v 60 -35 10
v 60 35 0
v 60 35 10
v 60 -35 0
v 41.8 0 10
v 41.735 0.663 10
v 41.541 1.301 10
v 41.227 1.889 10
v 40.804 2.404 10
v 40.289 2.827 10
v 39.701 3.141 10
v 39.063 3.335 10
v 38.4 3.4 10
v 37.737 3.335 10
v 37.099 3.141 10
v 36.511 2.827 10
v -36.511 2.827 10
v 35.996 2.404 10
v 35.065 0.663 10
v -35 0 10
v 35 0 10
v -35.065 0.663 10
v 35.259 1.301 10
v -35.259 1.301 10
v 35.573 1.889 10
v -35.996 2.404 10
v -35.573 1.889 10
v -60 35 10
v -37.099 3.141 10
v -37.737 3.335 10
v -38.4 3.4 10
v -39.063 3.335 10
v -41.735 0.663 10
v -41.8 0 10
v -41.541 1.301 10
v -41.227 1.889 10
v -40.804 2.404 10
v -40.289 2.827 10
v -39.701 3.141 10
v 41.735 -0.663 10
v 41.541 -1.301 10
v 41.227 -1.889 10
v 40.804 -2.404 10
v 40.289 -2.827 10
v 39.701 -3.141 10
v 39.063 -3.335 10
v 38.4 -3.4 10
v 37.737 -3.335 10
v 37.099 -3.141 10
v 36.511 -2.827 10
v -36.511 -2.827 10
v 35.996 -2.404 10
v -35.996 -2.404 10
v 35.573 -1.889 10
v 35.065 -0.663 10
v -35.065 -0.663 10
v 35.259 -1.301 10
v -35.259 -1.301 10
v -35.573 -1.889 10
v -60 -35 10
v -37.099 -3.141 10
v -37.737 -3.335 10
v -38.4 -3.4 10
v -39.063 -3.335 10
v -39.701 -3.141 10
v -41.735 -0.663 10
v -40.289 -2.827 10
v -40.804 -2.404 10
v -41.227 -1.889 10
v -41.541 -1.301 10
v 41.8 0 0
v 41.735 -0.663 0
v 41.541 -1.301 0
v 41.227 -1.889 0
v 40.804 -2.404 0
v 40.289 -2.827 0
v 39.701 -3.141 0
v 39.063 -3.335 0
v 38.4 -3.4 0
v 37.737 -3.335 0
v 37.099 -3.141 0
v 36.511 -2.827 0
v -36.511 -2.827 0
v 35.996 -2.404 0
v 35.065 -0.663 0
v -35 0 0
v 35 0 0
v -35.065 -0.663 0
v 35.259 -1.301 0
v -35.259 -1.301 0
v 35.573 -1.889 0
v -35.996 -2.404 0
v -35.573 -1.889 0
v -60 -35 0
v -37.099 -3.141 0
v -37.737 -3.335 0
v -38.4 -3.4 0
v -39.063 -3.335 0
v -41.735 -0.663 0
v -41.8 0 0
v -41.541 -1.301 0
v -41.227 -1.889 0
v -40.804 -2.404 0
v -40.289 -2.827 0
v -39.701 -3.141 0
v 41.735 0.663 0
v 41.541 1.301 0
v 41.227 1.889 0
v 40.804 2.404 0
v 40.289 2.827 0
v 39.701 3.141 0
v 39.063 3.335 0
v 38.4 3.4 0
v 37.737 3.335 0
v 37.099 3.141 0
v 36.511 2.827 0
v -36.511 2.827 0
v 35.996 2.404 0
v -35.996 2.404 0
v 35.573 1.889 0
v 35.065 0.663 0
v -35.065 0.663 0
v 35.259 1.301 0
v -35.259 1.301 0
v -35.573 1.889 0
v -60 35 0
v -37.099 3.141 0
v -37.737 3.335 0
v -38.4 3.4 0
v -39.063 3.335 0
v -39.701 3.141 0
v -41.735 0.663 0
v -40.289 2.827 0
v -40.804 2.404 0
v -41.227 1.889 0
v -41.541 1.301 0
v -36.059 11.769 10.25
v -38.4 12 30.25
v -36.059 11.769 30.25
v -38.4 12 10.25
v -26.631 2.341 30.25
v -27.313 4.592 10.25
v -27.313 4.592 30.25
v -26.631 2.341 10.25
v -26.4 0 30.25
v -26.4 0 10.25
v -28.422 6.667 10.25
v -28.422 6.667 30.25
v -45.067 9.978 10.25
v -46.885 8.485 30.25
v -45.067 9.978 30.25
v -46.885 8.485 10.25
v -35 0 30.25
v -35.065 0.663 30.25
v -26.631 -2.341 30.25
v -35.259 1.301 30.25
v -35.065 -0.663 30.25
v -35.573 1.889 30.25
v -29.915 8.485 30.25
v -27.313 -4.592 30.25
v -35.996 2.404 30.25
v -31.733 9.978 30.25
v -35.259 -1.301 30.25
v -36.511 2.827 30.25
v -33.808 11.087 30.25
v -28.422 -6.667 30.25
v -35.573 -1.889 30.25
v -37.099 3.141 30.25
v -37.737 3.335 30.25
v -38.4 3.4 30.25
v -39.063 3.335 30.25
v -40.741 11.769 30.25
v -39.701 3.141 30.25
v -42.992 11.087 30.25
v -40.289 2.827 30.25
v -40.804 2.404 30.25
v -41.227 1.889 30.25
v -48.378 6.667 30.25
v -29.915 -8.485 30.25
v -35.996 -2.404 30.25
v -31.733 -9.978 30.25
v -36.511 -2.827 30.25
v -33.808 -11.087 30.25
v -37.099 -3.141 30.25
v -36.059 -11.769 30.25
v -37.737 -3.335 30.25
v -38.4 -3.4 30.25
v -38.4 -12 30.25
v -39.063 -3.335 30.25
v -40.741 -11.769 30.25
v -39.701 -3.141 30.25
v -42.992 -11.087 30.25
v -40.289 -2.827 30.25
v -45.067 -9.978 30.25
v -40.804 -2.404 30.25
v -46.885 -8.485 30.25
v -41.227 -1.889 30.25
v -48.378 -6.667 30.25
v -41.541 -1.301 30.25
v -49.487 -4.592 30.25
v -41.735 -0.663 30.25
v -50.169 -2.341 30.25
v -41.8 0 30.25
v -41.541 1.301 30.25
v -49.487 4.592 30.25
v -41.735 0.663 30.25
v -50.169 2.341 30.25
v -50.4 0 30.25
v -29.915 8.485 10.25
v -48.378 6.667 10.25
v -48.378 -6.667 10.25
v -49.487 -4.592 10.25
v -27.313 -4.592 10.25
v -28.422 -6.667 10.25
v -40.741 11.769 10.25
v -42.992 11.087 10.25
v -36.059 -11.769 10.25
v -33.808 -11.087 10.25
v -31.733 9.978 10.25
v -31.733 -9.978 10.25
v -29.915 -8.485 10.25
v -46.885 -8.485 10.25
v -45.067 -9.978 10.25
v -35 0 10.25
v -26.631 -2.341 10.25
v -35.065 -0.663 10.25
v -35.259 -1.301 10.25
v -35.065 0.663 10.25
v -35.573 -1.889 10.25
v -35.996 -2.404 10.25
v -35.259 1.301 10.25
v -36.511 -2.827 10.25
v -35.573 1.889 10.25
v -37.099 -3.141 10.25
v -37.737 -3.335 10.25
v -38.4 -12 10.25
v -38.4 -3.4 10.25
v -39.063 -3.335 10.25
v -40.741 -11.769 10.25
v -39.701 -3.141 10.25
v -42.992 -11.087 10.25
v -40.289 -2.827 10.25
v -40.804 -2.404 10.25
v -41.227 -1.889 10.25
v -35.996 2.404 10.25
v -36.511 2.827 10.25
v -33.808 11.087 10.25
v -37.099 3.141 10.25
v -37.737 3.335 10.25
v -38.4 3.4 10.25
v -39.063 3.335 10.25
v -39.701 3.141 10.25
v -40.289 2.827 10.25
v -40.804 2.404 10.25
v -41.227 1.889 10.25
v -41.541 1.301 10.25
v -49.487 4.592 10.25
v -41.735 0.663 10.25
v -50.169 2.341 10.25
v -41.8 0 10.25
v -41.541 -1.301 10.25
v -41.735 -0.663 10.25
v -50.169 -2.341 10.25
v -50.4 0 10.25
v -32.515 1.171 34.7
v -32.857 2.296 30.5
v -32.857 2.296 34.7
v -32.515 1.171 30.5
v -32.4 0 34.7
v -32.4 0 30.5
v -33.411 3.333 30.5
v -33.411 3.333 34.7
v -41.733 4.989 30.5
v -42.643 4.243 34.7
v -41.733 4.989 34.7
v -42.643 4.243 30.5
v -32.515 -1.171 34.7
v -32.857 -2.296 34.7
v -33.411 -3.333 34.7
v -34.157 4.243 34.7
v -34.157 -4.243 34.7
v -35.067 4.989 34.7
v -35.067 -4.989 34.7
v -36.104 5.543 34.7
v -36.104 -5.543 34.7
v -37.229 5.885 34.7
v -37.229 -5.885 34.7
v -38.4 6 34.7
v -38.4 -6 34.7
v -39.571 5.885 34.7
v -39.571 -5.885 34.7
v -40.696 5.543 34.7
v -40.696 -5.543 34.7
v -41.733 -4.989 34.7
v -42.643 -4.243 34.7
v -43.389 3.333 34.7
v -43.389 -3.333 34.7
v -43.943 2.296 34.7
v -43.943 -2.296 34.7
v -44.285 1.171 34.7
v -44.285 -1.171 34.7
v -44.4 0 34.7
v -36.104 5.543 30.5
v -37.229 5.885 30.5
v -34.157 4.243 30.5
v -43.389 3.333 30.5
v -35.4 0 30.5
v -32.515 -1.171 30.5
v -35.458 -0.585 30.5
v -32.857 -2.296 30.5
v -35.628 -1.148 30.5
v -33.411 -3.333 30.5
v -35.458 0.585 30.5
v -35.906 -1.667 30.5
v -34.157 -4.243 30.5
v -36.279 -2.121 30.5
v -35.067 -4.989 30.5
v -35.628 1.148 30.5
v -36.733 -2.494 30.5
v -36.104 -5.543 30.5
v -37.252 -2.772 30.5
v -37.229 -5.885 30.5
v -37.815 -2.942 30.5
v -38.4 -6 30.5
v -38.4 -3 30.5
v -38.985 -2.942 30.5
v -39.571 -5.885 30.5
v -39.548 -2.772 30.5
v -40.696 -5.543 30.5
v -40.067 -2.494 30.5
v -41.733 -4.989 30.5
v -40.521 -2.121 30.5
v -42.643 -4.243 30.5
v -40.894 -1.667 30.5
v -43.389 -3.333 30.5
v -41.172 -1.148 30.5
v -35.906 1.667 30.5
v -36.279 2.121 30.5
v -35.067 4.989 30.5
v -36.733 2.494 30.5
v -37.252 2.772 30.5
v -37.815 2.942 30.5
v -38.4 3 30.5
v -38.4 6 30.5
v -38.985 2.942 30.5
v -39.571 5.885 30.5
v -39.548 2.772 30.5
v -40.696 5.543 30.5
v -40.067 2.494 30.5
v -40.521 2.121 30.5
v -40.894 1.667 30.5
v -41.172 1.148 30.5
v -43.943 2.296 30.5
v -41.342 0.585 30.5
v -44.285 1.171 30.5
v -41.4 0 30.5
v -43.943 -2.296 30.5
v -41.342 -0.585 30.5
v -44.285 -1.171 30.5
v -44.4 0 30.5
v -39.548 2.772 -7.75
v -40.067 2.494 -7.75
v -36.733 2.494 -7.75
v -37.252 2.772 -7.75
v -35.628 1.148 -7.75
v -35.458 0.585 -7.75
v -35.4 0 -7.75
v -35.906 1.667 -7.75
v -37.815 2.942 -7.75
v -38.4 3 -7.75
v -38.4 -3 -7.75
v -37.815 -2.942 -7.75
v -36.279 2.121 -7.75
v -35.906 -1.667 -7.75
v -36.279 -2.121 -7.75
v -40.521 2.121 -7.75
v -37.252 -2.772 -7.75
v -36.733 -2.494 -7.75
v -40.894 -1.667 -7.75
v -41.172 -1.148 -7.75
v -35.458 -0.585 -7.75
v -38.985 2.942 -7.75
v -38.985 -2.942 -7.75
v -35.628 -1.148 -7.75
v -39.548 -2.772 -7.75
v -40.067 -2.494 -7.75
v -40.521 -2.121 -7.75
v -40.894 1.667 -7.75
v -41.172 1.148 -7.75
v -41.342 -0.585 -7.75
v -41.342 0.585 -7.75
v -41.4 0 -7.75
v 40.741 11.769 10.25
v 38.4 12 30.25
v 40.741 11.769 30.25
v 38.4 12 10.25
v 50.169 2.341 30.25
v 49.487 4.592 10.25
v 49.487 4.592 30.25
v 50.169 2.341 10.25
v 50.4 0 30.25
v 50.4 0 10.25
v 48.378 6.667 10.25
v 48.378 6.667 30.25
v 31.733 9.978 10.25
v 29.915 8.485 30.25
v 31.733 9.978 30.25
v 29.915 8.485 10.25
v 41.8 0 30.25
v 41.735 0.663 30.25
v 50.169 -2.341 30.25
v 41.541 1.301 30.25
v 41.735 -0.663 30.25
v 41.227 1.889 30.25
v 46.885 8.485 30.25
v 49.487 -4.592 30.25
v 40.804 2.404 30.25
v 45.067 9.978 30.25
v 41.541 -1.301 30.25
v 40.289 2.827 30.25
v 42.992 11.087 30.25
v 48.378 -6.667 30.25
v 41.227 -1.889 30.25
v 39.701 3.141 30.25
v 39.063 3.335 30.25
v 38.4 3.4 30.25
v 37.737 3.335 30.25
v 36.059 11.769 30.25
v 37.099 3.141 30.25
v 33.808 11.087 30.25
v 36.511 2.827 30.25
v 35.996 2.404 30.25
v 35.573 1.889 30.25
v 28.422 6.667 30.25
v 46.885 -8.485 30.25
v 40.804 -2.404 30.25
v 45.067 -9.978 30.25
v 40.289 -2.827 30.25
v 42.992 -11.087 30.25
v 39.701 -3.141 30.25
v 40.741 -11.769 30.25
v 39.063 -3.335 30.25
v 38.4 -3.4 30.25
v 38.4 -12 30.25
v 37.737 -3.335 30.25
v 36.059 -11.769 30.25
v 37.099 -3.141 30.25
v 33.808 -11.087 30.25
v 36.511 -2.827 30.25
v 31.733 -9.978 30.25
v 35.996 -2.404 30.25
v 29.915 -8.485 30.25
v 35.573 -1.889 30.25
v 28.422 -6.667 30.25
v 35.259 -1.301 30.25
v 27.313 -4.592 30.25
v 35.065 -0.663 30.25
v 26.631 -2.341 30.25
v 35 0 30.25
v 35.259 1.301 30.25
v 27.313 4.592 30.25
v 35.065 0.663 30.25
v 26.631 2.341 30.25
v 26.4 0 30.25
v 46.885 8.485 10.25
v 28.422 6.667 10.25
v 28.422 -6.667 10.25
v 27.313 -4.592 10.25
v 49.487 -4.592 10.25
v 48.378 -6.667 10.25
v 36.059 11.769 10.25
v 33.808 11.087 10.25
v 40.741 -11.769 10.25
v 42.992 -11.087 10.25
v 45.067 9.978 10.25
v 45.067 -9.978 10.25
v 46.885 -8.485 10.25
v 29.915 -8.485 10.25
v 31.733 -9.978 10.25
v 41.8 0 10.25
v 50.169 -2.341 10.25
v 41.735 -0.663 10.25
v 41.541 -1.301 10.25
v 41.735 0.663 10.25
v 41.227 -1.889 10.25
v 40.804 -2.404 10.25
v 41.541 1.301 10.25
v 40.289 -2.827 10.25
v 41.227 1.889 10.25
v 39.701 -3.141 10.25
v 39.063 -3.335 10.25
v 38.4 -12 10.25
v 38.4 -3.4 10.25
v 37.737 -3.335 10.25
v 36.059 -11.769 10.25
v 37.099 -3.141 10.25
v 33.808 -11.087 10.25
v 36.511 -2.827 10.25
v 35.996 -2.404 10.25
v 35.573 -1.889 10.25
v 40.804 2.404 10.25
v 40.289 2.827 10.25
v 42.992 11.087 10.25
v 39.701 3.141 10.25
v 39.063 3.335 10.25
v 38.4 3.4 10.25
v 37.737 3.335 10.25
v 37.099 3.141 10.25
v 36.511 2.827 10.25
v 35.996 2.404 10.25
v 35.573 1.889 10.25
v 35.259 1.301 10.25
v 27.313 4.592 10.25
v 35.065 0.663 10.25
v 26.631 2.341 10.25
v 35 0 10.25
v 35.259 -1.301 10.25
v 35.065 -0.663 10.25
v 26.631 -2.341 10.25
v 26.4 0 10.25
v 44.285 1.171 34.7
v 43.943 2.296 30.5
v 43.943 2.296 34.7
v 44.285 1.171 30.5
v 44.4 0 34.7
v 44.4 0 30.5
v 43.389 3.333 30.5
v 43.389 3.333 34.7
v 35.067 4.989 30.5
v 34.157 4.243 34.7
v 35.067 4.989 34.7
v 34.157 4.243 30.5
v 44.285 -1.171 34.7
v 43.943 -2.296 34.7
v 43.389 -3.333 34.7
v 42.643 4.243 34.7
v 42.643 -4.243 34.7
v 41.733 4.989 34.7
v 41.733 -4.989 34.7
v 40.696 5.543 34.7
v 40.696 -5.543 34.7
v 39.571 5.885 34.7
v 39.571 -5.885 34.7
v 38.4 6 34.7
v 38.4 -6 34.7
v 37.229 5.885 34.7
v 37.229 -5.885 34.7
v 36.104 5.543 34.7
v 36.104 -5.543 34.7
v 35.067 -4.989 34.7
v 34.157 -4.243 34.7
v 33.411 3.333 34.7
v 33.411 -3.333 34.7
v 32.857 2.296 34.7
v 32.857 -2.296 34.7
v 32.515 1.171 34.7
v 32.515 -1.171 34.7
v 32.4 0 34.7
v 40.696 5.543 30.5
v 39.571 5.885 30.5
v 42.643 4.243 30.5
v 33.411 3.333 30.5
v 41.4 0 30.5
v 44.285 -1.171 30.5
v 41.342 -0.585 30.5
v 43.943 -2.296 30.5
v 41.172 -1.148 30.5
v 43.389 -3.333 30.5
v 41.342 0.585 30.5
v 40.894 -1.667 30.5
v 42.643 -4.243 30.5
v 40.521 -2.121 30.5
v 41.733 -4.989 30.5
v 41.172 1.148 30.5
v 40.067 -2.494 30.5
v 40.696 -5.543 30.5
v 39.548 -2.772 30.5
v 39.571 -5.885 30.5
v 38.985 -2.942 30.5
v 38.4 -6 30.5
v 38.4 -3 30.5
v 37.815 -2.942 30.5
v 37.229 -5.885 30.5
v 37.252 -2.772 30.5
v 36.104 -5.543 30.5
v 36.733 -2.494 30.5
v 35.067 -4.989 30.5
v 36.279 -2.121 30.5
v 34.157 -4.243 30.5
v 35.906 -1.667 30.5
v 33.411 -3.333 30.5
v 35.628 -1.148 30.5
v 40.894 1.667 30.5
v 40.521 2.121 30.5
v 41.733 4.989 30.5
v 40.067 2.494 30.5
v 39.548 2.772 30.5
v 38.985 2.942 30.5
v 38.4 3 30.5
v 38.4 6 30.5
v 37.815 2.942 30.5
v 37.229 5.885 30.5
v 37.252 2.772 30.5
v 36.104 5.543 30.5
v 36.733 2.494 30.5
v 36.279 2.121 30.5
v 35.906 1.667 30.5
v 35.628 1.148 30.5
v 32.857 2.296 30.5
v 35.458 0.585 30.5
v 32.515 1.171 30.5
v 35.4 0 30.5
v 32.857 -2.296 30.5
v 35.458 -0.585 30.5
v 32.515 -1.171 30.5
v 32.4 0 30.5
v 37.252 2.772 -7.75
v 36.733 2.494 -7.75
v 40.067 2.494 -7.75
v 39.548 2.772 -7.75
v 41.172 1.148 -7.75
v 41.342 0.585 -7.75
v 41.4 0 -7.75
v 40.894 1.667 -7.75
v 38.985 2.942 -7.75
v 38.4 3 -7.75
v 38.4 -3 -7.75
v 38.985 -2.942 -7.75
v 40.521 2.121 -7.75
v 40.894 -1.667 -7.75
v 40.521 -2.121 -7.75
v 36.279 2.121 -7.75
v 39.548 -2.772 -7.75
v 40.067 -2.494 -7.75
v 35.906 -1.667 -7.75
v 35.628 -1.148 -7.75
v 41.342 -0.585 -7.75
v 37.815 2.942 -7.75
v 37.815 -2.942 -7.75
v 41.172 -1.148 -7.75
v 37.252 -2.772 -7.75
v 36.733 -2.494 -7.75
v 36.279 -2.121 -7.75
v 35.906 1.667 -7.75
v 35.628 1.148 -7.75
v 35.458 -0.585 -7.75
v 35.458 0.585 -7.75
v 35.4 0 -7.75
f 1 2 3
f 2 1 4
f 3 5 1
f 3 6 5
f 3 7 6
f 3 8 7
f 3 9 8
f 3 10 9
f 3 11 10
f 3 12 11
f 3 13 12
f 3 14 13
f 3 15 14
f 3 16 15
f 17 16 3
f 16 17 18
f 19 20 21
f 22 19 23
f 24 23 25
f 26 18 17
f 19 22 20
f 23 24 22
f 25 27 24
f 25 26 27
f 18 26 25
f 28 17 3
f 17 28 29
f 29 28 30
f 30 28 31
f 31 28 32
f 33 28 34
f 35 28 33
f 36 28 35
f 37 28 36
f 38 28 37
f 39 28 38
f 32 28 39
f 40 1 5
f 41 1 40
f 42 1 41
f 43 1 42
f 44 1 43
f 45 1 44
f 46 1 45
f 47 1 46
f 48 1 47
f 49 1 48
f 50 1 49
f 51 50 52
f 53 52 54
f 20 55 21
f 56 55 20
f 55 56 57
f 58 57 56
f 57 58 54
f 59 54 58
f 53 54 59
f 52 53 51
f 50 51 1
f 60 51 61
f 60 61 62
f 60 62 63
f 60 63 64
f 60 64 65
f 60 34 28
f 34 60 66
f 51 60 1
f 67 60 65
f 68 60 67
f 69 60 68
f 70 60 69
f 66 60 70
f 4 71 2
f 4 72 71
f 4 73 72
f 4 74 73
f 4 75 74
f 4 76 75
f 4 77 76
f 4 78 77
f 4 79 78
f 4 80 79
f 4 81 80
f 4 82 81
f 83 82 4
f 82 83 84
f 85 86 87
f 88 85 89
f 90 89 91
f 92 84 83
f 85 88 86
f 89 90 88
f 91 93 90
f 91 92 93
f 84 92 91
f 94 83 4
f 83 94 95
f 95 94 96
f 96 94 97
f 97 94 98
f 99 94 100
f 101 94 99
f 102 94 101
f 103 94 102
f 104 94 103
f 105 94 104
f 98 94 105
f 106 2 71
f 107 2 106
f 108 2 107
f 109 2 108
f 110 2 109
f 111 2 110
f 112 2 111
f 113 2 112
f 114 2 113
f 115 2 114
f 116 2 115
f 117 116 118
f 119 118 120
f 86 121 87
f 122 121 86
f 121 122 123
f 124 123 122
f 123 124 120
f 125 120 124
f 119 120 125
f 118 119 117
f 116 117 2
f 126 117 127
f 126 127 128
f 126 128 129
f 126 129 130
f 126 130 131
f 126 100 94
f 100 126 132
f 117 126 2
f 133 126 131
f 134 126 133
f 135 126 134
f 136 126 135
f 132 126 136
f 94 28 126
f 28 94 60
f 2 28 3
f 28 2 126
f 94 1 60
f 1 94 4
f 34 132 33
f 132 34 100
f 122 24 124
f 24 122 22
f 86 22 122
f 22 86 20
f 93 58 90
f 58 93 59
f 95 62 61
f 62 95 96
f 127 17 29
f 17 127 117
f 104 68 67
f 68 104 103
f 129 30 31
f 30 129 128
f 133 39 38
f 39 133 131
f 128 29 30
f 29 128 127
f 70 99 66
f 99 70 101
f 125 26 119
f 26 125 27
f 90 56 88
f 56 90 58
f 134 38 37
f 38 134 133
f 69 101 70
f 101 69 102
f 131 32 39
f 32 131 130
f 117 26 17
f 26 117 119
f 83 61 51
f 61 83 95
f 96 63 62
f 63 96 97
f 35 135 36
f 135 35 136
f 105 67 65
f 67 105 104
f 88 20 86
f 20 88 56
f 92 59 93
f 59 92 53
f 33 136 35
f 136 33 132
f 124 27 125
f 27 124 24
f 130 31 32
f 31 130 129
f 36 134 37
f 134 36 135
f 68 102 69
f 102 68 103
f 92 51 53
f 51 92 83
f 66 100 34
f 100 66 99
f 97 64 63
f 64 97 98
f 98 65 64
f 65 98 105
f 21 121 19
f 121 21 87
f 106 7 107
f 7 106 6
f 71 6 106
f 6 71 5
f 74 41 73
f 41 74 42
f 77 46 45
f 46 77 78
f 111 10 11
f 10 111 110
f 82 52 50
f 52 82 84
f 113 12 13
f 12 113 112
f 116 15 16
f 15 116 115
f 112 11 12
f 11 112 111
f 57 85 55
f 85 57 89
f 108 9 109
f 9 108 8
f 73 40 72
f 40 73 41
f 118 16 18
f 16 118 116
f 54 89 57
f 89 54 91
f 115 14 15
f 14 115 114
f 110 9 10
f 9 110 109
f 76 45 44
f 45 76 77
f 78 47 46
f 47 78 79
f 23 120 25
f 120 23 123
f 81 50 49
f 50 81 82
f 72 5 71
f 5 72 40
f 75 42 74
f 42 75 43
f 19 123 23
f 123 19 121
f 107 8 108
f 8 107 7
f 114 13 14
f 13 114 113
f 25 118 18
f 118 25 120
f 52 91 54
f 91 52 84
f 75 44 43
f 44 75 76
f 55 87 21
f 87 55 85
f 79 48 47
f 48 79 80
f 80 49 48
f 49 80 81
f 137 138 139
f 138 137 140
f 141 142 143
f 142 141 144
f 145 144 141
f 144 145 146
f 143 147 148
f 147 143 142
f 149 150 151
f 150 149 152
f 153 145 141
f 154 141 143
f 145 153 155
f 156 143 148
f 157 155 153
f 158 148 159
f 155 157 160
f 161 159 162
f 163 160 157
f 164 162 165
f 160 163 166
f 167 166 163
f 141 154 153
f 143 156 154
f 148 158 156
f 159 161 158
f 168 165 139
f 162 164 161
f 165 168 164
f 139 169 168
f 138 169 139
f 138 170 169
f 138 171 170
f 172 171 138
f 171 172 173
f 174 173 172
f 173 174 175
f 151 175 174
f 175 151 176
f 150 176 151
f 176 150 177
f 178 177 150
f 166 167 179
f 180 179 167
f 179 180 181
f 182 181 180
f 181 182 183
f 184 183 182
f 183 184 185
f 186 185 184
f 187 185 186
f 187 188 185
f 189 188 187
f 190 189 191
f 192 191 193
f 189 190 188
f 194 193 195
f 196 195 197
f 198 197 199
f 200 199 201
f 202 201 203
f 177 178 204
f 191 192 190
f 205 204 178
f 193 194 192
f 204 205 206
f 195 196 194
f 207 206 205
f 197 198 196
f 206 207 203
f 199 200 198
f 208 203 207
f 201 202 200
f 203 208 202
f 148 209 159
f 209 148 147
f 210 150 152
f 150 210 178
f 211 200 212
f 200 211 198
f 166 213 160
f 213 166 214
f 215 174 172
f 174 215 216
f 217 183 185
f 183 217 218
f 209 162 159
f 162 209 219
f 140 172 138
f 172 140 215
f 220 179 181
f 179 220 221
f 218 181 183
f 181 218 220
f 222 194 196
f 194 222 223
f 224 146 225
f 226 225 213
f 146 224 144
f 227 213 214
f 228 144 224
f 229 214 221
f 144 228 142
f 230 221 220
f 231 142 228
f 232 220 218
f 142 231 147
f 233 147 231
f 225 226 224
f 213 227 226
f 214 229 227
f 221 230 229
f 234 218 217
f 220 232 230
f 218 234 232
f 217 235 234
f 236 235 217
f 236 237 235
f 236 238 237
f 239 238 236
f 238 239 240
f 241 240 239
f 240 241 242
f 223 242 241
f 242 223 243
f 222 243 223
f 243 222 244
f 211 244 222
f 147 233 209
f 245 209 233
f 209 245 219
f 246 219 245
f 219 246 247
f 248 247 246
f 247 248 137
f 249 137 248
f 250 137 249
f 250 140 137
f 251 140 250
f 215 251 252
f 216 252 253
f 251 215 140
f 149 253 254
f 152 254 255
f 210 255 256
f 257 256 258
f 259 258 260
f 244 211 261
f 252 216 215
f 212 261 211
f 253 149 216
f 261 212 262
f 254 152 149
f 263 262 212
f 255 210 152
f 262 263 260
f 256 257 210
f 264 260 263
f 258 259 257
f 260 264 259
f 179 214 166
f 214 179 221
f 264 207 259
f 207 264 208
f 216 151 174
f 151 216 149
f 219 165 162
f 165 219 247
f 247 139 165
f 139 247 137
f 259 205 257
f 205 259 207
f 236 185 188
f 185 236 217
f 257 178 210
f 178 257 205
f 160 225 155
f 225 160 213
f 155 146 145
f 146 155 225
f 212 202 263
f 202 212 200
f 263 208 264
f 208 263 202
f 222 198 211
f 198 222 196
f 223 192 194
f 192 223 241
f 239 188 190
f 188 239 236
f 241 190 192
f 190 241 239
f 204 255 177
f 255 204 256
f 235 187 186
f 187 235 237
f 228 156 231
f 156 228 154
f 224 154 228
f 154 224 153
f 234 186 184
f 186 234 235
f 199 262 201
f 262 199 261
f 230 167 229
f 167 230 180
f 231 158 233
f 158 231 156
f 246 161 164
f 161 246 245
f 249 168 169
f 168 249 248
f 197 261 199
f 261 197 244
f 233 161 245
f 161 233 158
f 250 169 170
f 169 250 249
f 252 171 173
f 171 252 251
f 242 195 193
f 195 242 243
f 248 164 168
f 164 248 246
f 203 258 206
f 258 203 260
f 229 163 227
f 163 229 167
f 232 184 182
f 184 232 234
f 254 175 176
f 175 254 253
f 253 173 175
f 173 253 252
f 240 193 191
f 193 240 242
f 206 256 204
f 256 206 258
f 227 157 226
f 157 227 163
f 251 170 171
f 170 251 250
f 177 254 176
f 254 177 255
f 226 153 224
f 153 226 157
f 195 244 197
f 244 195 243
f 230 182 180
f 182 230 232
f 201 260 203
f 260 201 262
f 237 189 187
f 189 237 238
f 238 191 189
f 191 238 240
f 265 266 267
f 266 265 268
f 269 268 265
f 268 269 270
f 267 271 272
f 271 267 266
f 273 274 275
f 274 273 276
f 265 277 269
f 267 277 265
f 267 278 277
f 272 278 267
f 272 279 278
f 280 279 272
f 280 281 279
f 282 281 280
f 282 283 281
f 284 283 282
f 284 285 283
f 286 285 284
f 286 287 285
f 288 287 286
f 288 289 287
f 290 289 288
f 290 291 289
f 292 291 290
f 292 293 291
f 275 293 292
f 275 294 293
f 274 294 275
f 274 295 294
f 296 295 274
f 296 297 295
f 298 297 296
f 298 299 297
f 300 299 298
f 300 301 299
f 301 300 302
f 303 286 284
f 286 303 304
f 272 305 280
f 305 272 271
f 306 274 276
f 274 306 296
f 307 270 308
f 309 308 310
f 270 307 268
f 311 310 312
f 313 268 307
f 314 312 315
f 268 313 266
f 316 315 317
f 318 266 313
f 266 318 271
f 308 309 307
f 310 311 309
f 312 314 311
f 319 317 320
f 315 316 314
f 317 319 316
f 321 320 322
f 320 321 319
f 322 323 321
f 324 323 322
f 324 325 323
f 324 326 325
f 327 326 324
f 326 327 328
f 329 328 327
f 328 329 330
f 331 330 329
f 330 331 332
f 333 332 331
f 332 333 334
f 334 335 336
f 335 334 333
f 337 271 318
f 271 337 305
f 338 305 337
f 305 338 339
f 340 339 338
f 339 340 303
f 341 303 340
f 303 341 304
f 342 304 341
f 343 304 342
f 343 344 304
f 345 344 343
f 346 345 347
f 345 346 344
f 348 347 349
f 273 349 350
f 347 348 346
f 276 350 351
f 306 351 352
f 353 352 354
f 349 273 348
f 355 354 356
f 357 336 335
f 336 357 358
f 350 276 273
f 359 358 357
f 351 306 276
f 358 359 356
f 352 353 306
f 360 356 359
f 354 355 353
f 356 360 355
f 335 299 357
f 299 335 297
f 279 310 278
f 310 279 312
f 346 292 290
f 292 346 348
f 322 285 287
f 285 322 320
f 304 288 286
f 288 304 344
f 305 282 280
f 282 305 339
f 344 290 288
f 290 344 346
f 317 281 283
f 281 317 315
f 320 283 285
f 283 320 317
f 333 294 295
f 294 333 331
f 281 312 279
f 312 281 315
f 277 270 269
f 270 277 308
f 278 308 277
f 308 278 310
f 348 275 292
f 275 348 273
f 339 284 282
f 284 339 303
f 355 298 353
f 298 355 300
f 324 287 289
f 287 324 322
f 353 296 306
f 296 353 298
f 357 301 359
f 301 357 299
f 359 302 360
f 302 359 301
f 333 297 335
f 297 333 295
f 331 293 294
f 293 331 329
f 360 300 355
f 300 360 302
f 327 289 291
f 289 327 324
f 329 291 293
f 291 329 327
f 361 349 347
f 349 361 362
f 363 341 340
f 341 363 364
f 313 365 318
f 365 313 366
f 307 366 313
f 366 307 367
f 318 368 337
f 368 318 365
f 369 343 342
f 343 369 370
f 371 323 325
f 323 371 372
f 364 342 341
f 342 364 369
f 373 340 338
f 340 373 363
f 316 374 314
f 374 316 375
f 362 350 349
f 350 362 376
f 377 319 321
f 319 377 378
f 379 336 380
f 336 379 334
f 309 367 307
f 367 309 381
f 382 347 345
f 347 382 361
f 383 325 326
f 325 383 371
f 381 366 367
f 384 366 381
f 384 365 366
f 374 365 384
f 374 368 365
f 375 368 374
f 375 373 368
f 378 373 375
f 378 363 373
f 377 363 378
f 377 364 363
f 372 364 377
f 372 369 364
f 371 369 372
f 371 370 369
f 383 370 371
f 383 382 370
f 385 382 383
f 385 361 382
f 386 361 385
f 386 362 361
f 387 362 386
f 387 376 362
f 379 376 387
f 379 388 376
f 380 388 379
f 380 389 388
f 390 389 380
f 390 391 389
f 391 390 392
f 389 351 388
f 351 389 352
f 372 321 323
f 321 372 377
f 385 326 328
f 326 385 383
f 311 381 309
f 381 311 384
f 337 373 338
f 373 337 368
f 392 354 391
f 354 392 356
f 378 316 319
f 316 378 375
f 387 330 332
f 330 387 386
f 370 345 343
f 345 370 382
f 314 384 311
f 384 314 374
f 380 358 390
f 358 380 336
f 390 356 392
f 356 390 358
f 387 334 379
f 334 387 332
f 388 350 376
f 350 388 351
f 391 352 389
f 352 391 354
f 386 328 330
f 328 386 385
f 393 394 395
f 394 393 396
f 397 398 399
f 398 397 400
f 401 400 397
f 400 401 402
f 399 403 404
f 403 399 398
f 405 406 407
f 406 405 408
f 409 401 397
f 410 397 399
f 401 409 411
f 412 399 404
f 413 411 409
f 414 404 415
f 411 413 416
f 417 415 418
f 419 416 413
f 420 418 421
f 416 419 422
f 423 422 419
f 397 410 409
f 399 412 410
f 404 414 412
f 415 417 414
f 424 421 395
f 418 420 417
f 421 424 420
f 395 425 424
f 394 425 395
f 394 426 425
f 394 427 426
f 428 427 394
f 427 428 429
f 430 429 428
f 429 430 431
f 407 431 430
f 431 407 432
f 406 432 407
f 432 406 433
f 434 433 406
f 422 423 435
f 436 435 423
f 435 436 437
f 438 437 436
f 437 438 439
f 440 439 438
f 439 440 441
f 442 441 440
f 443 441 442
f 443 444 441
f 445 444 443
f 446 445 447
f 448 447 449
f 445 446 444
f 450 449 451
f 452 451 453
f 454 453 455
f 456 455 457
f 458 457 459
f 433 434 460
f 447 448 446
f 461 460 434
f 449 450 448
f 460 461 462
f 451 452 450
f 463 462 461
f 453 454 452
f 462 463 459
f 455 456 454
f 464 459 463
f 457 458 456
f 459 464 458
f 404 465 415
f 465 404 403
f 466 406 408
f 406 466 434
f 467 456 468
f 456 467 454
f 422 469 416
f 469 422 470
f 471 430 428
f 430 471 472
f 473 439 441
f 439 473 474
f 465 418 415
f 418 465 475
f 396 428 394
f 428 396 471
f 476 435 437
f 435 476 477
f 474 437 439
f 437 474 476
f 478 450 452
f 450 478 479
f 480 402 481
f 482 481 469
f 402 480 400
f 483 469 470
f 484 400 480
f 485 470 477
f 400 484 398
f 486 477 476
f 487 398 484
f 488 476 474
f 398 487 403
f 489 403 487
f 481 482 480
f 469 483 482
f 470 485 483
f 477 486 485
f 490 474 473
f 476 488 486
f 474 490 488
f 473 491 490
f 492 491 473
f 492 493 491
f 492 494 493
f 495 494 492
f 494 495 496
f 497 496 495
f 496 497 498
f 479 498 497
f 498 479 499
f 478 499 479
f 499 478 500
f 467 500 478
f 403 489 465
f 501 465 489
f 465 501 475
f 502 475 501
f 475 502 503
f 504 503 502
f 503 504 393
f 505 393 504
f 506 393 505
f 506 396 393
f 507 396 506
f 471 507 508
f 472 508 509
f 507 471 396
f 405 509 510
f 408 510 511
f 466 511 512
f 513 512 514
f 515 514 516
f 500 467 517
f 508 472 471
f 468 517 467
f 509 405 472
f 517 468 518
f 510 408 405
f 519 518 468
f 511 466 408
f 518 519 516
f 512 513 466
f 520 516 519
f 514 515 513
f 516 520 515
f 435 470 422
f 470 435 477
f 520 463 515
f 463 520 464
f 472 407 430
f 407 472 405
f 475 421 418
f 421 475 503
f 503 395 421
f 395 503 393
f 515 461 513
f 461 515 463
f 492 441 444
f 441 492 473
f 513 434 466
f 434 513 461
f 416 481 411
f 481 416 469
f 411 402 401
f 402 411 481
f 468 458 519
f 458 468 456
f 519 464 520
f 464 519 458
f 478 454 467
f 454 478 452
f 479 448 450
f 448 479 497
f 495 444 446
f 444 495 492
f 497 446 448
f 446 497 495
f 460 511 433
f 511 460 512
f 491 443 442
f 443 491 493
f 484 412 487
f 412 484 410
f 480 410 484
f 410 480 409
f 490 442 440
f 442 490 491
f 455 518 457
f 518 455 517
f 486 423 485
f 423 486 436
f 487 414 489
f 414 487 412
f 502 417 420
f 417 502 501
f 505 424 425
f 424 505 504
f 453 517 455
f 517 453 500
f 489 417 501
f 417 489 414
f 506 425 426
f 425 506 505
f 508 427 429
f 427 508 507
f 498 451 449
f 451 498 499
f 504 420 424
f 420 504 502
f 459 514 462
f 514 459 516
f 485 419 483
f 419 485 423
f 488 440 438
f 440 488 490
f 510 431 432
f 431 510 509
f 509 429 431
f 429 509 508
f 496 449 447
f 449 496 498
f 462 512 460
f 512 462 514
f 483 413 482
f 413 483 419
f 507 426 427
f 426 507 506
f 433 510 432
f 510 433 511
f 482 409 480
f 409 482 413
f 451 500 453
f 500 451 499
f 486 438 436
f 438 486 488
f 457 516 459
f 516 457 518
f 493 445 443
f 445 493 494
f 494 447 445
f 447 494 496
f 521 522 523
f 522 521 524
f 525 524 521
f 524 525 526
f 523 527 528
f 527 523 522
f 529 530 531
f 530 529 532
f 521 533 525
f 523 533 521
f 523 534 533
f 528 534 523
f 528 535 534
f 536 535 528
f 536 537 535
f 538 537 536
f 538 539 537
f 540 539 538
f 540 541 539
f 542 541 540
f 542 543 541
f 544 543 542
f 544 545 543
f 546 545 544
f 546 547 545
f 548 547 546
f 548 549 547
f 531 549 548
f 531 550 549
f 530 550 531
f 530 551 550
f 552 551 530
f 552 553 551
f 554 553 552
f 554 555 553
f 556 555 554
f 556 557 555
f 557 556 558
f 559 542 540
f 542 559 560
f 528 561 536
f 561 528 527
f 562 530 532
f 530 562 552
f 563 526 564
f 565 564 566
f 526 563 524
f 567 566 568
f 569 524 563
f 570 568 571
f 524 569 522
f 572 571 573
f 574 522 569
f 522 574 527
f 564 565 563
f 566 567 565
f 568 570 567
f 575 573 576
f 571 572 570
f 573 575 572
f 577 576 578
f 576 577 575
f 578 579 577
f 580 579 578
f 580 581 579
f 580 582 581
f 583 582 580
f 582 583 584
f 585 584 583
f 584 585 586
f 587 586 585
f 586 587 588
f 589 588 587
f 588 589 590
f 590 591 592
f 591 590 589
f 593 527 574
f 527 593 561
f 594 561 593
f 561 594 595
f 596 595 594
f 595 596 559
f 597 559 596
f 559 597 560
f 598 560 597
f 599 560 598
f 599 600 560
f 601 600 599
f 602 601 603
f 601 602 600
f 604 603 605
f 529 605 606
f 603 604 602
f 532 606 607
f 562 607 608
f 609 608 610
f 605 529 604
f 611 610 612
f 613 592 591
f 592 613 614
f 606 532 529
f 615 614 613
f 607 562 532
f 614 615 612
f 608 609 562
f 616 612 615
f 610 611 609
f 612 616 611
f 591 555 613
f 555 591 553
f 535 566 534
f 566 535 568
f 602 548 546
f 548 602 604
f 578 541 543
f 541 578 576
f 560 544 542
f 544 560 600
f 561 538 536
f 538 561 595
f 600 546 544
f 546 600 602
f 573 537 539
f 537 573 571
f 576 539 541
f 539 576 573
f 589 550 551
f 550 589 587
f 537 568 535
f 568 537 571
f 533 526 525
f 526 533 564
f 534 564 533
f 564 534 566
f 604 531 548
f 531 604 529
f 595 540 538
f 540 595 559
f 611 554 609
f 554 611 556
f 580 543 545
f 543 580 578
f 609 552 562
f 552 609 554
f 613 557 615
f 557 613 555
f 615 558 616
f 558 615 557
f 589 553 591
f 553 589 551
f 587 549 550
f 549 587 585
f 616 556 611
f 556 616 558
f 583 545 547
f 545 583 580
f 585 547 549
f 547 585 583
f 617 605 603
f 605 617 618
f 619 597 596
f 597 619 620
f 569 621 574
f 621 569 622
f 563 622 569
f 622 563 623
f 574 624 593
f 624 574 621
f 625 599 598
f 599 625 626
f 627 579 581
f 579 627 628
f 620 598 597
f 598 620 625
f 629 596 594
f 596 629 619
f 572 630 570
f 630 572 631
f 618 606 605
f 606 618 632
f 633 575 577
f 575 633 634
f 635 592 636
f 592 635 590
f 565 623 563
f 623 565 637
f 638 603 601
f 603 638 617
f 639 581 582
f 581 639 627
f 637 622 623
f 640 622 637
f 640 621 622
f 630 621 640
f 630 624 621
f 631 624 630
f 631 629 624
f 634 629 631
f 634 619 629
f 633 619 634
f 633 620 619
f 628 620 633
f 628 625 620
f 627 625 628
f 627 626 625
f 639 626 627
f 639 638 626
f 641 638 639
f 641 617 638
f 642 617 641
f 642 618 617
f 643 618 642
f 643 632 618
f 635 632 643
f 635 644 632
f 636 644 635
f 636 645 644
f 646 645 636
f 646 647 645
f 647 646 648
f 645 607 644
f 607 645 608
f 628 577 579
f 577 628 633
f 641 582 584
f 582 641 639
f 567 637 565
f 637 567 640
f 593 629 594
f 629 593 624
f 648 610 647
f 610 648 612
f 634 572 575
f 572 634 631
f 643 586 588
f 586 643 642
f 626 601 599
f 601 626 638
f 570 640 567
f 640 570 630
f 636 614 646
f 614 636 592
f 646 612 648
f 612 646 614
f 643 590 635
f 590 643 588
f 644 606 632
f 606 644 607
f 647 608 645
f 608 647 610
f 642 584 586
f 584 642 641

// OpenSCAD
$fn = 32;

// ------------------------------------------------------------------------
// Standoff columns: 2 d24 standoffs, bolts d6
// Every part is its own module, assembly() places them once.
// ------------------------------------------------------------------------

// --- part 1 ---
module base_plate() {
  difference() {
    translate([-60, -35, 0]) cube([120, 70, 10]);
    translate([-38.4, 0, -1]) cylinder(h = 12, d = 6.8);
    translate([38.4, 0, -1]) cylinder(h = 12, d = 6.8);
  }
}

// --- part 2 ---
module spacer1() {
  difference() {
      translate([0, 0, 0]) cylinder(h = 20, d = 24);
      translate([0, 0, -1]) cylinder(h = 22, d = 6.8);
    }
}

// --- part 3 ---
module bolt1() {
  cylinder(h = 4.2, d = 12);
  translate([0, 0, -38.25]) cylinder(h = 38.25, d = 6);
}

// --- part 4 ---
module spacer2() {
  difference() {
      translate([0, 0, 0]) cylinder(h = 20, d = 24);
      translate([0, 0, -1]) cylinder(h = 22, d = 6.8);
    }
}

// --- part 5 ---
module bolt2() {
  cylinder(h = 4.2, d = 12);
  translate([0, 0, -38.25]) cylinder(h = 38.25, d = 6);
}

// --- assembly ---
module assembly() {
  translate([0, 0, 0]) rotate([0, 0, 0]) base_plate();
  translate([-38.4, 0, 10.25]) rotate([0, 0, 0]) spacer1();
  translate([-38.4, 0, 30.5]) rotate([0, 0, 0]) bolt1();
  translate([38.4, 0, 10.25]) rotate([0, 0, 0]) spacer2();
  translate([38.4, 0, 30.5]) rotate([0, 0, 0]) bolt2();
}

assembly();
